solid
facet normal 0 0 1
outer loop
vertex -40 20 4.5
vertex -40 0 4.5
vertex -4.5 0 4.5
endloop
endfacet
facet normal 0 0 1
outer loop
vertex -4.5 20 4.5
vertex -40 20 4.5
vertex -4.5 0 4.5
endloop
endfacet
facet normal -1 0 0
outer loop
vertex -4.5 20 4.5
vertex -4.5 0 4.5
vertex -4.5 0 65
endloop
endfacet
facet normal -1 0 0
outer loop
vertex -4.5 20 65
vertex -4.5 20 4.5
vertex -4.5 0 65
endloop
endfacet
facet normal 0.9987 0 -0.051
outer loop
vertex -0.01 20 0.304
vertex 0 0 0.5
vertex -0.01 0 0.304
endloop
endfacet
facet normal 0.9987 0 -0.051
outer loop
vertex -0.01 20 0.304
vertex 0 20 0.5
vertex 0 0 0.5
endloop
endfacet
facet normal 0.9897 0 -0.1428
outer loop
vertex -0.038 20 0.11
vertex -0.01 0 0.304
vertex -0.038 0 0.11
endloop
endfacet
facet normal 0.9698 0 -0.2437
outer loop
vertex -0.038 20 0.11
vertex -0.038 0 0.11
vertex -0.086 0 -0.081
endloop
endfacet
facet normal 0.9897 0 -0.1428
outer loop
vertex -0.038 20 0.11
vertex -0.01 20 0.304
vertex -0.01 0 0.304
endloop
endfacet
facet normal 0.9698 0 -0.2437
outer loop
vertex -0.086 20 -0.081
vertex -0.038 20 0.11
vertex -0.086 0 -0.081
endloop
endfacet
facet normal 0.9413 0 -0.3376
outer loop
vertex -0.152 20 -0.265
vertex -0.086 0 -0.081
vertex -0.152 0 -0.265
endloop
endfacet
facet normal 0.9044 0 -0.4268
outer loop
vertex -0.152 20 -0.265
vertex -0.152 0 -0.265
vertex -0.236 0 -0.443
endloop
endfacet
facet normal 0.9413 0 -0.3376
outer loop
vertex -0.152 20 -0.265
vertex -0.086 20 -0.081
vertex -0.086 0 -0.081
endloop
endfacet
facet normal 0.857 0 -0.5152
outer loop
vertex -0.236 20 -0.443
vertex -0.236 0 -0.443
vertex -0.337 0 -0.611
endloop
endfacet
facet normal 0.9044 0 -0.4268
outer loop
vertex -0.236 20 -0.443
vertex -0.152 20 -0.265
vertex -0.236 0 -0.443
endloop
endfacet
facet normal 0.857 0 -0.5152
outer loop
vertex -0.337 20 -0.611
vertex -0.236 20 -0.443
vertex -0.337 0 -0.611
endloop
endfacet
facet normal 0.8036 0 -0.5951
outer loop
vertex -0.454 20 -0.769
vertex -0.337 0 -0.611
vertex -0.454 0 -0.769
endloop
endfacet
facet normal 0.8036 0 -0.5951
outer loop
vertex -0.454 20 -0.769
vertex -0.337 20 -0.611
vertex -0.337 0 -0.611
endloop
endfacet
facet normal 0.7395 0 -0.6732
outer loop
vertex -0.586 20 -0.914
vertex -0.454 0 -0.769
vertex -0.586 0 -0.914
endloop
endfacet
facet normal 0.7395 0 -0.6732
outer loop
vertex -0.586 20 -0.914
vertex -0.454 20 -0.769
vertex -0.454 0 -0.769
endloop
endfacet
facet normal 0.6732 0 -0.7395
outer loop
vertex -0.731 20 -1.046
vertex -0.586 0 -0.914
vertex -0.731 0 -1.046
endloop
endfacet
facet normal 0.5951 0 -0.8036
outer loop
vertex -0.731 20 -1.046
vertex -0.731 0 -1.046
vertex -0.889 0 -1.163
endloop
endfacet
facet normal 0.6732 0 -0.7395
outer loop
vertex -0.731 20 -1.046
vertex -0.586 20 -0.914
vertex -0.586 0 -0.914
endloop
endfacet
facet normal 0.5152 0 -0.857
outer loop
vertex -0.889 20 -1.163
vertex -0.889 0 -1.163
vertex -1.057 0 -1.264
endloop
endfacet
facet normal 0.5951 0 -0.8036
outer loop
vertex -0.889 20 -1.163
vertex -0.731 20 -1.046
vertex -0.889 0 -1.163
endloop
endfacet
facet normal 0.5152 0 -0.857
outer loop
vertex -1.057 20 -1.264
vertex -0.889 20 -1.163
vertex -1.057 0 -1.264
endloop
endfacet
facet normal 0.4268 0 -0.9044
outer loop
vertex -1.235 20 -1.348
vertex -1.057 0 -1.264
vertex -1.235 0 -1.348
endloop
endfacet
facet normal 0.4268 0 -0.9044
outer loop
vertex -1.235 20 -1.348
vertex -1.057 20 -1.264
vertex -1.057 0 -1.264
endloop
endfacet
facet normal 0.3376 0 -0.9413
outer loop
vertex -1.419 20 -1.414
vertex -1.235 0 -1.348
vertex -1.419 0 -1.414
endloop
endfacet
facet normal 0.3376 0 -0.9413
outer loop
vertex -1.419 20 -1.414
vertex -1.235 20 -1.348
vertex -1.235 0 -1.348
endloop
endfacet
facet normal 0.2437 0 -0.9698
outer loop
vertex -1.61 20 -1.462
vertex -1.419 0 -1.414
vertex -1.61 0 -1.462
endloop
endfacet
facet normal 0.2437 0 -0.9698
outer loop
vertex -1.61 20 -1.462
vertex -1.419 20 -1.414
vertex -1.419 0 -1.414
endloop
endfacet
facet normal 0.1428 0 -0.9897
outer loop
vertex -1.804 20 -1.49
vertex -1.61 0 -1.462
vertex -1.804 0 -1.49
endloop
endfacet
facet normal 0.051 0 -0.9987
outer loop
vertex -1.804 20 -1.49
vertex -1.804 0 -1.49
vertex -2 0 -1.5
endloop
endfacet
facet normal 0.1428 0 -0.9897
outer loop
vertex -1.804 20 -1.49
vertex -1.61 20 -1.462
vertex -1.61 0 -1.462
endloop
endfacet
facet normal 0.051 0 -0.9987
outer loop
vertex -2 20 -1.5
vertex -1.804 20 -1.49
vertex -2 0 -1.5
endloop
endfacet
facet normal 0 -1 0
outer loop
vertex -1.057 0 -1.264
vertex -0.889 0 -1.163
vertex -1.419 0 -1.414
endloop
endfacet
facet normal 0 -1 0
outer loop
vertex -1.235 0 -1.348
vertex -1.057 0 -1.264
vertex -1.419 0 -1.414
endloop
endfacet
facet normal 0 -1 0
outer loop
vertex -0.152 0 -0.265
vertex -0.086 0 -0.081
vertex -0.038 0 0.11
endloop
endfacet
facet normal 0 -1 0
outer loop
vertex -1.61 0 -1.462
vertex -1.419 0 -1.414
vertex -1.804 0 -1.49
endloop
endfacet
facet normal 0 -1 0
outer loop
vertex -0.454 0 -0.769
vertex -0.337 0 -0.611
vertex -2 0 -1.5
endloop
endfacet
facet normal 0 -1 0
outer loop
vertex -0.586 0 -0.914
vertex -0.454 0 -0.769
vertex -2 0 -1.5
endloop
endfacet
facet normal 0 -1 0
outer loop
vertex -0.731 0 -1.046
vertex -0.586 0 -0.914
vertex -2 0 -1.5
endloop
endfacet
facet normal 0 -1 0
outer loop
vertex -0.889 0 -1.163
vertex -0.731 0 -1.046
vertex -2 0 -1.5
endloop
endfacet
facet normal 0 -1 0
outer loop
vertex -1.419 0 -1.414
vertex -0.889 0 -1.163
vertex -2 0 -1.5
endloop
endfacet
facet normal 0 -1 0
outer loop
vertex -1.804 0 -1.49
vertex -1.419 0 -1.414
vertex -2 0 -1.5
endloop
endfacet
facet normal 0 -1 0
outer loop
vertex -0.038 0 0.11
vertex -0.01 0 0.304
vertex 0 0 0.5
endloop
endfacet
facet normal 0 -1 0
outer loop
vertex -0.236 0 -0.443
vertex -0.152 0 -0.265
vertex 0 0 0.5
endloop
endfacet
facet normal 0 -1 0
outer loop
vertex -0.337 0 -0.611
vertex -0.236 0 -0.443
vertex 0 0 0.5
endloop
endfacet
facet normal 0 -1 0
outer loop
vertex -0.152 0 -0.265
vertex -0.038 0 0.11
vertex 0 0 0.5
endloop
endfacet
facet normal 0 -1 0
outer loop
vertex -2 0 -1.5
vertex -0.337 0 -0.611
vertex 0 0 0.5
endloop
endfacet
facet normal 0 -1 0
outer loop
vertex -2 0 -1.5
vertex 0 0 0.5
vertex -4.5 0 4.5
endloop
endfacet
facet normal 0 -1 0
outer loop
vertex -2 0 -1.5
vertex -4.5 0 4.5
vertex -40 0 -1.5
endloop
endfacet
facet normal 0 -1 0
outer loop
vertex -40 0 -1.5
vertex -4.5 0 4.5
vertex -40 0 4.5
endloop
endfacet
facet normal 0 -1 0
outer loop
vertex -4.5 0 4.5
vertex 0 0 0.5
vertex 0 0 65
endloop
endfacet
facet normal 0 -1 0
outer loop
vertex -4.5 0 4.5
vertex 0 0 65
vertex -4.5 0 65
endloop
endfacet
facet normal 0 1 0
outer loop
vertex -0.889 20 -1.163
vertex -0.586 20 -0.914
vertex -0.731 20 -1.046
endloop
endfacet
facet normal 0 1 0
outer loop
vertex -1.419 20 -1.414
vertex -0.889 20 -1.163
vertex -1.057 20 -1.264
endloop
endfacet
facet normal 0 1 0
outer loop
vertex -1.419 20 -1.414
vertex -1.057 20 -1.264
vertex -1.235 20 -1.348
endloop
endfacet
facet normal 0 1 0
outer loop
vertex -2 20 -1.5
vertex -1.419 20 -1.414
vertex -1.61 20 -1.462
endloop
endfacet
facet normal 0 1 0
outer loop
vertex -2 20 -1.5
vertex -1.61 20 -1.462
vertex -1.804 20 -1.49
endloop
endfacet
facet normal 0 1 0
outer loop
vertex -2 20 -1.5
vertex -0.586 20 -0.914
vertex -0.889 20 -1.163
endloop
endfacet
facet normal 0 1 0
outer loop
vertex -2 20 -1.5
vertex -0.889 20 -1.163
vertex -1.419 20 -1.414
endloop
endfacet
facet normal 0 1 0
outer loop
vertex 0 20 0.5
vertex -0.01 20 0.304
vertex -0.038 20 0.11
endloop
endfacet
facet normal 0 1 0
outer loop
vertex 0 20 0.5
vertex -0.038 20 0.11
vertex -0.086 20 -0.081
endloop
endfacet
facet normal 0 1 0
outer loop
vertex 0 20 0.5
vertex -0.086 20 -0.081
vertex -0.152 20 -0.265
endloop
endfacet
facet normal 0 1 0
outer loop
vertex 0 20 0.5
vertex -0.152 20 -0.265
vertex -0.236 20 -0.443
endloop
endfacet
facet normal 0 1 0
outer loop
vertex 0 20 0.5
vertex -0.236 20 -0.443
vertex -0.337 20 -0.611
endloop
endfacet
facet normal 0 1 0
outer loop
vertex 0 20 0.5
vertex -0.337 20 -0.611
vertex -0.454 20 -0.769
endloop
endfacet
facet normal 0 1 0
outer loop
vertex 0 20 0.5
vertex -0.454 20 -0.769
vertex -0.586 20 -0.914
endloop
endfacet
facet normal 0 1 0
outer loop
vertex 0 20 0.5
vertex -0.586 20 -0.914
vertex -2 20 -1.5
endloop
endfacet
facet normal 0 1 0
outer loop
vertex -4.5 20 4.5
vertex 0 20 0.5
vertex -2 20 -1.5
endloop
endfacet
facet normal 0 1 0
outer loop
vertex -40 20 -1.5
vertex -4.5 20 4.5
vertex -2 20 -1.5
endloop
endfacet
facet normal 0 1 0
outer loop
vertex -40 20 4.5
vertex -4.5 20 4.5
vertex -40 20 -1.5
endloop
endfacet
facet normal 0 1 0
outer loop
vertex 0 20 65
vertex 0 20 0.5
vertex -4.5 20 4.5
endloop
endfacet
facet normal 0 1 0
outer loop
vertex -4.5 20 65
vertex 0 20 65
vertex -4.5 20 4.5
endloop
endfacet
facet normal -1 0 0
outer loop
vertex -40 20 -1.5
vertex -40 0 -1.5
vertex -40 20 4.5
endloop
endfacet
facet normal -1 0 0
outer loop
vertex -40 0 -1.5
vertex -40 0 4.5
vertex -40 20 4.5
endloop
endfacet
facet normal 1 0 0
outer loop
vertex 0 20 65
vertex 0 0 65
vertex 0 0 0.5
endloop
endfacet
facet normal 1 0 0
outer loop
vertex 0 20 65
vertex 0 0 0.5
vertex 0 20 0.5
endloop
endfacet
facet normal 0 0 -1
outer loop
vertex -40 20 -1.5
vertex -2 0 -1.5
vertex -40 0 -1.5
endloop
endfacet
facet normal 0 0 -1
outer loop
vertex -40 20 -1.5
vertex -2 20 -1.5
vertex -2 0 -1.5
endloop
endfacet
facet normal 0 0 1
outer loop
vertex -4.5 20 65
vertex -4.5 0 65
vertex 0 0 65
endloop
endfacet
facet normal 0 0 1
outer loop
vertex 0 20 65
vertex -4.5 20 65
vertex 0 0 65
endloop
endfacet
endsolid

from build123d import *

# Parameters (mm, degrees)
EXTRUDE_THIN1_DEPTH = 20
SKETCH2_W           = 40
SKETCH2_H           = 20
BOSS_EXTRUDE1_DEPTH = 1.5
FILLET1_R           = 2


with BuildPart() as part:
    # Sketch1 → Extrude-Thin1 (new body)
    with BuildSketch(Plane(origin=(0, 0, 0), x_dir=(1, 0, 0), z_dir=(0, 1, 0))):
        Polygon((0, -65), (0, 0), (-40, 0), (-40, -4.5), (-4.5, -4.5), (-4.5, -65), align=None)
    extrude(amount=EXTRUDE_THIN1_DEPTH)

    # Sketch2 → Boss-Extrude1 (add)
    with BuildSketch(Plane(origin=(0, 0, 0), x_dir=(-1, 0, 0), z_dir=(0, 0, -1))):
        with Locations((20, 10)):
            Rectangle(SKETCH2_W, SKETCH2_H)
    extrude(amount=BOSS_EXTRUDE1_DEPTH)

    # Fillet1
    fillet1_edges = [part.edges().sort_by_distance(p)[0] for p in [
        (0, 10, -1.5),
    ]]
    fillet(fillet1_edges, radius=FILLET1_R)


solid = part.part
